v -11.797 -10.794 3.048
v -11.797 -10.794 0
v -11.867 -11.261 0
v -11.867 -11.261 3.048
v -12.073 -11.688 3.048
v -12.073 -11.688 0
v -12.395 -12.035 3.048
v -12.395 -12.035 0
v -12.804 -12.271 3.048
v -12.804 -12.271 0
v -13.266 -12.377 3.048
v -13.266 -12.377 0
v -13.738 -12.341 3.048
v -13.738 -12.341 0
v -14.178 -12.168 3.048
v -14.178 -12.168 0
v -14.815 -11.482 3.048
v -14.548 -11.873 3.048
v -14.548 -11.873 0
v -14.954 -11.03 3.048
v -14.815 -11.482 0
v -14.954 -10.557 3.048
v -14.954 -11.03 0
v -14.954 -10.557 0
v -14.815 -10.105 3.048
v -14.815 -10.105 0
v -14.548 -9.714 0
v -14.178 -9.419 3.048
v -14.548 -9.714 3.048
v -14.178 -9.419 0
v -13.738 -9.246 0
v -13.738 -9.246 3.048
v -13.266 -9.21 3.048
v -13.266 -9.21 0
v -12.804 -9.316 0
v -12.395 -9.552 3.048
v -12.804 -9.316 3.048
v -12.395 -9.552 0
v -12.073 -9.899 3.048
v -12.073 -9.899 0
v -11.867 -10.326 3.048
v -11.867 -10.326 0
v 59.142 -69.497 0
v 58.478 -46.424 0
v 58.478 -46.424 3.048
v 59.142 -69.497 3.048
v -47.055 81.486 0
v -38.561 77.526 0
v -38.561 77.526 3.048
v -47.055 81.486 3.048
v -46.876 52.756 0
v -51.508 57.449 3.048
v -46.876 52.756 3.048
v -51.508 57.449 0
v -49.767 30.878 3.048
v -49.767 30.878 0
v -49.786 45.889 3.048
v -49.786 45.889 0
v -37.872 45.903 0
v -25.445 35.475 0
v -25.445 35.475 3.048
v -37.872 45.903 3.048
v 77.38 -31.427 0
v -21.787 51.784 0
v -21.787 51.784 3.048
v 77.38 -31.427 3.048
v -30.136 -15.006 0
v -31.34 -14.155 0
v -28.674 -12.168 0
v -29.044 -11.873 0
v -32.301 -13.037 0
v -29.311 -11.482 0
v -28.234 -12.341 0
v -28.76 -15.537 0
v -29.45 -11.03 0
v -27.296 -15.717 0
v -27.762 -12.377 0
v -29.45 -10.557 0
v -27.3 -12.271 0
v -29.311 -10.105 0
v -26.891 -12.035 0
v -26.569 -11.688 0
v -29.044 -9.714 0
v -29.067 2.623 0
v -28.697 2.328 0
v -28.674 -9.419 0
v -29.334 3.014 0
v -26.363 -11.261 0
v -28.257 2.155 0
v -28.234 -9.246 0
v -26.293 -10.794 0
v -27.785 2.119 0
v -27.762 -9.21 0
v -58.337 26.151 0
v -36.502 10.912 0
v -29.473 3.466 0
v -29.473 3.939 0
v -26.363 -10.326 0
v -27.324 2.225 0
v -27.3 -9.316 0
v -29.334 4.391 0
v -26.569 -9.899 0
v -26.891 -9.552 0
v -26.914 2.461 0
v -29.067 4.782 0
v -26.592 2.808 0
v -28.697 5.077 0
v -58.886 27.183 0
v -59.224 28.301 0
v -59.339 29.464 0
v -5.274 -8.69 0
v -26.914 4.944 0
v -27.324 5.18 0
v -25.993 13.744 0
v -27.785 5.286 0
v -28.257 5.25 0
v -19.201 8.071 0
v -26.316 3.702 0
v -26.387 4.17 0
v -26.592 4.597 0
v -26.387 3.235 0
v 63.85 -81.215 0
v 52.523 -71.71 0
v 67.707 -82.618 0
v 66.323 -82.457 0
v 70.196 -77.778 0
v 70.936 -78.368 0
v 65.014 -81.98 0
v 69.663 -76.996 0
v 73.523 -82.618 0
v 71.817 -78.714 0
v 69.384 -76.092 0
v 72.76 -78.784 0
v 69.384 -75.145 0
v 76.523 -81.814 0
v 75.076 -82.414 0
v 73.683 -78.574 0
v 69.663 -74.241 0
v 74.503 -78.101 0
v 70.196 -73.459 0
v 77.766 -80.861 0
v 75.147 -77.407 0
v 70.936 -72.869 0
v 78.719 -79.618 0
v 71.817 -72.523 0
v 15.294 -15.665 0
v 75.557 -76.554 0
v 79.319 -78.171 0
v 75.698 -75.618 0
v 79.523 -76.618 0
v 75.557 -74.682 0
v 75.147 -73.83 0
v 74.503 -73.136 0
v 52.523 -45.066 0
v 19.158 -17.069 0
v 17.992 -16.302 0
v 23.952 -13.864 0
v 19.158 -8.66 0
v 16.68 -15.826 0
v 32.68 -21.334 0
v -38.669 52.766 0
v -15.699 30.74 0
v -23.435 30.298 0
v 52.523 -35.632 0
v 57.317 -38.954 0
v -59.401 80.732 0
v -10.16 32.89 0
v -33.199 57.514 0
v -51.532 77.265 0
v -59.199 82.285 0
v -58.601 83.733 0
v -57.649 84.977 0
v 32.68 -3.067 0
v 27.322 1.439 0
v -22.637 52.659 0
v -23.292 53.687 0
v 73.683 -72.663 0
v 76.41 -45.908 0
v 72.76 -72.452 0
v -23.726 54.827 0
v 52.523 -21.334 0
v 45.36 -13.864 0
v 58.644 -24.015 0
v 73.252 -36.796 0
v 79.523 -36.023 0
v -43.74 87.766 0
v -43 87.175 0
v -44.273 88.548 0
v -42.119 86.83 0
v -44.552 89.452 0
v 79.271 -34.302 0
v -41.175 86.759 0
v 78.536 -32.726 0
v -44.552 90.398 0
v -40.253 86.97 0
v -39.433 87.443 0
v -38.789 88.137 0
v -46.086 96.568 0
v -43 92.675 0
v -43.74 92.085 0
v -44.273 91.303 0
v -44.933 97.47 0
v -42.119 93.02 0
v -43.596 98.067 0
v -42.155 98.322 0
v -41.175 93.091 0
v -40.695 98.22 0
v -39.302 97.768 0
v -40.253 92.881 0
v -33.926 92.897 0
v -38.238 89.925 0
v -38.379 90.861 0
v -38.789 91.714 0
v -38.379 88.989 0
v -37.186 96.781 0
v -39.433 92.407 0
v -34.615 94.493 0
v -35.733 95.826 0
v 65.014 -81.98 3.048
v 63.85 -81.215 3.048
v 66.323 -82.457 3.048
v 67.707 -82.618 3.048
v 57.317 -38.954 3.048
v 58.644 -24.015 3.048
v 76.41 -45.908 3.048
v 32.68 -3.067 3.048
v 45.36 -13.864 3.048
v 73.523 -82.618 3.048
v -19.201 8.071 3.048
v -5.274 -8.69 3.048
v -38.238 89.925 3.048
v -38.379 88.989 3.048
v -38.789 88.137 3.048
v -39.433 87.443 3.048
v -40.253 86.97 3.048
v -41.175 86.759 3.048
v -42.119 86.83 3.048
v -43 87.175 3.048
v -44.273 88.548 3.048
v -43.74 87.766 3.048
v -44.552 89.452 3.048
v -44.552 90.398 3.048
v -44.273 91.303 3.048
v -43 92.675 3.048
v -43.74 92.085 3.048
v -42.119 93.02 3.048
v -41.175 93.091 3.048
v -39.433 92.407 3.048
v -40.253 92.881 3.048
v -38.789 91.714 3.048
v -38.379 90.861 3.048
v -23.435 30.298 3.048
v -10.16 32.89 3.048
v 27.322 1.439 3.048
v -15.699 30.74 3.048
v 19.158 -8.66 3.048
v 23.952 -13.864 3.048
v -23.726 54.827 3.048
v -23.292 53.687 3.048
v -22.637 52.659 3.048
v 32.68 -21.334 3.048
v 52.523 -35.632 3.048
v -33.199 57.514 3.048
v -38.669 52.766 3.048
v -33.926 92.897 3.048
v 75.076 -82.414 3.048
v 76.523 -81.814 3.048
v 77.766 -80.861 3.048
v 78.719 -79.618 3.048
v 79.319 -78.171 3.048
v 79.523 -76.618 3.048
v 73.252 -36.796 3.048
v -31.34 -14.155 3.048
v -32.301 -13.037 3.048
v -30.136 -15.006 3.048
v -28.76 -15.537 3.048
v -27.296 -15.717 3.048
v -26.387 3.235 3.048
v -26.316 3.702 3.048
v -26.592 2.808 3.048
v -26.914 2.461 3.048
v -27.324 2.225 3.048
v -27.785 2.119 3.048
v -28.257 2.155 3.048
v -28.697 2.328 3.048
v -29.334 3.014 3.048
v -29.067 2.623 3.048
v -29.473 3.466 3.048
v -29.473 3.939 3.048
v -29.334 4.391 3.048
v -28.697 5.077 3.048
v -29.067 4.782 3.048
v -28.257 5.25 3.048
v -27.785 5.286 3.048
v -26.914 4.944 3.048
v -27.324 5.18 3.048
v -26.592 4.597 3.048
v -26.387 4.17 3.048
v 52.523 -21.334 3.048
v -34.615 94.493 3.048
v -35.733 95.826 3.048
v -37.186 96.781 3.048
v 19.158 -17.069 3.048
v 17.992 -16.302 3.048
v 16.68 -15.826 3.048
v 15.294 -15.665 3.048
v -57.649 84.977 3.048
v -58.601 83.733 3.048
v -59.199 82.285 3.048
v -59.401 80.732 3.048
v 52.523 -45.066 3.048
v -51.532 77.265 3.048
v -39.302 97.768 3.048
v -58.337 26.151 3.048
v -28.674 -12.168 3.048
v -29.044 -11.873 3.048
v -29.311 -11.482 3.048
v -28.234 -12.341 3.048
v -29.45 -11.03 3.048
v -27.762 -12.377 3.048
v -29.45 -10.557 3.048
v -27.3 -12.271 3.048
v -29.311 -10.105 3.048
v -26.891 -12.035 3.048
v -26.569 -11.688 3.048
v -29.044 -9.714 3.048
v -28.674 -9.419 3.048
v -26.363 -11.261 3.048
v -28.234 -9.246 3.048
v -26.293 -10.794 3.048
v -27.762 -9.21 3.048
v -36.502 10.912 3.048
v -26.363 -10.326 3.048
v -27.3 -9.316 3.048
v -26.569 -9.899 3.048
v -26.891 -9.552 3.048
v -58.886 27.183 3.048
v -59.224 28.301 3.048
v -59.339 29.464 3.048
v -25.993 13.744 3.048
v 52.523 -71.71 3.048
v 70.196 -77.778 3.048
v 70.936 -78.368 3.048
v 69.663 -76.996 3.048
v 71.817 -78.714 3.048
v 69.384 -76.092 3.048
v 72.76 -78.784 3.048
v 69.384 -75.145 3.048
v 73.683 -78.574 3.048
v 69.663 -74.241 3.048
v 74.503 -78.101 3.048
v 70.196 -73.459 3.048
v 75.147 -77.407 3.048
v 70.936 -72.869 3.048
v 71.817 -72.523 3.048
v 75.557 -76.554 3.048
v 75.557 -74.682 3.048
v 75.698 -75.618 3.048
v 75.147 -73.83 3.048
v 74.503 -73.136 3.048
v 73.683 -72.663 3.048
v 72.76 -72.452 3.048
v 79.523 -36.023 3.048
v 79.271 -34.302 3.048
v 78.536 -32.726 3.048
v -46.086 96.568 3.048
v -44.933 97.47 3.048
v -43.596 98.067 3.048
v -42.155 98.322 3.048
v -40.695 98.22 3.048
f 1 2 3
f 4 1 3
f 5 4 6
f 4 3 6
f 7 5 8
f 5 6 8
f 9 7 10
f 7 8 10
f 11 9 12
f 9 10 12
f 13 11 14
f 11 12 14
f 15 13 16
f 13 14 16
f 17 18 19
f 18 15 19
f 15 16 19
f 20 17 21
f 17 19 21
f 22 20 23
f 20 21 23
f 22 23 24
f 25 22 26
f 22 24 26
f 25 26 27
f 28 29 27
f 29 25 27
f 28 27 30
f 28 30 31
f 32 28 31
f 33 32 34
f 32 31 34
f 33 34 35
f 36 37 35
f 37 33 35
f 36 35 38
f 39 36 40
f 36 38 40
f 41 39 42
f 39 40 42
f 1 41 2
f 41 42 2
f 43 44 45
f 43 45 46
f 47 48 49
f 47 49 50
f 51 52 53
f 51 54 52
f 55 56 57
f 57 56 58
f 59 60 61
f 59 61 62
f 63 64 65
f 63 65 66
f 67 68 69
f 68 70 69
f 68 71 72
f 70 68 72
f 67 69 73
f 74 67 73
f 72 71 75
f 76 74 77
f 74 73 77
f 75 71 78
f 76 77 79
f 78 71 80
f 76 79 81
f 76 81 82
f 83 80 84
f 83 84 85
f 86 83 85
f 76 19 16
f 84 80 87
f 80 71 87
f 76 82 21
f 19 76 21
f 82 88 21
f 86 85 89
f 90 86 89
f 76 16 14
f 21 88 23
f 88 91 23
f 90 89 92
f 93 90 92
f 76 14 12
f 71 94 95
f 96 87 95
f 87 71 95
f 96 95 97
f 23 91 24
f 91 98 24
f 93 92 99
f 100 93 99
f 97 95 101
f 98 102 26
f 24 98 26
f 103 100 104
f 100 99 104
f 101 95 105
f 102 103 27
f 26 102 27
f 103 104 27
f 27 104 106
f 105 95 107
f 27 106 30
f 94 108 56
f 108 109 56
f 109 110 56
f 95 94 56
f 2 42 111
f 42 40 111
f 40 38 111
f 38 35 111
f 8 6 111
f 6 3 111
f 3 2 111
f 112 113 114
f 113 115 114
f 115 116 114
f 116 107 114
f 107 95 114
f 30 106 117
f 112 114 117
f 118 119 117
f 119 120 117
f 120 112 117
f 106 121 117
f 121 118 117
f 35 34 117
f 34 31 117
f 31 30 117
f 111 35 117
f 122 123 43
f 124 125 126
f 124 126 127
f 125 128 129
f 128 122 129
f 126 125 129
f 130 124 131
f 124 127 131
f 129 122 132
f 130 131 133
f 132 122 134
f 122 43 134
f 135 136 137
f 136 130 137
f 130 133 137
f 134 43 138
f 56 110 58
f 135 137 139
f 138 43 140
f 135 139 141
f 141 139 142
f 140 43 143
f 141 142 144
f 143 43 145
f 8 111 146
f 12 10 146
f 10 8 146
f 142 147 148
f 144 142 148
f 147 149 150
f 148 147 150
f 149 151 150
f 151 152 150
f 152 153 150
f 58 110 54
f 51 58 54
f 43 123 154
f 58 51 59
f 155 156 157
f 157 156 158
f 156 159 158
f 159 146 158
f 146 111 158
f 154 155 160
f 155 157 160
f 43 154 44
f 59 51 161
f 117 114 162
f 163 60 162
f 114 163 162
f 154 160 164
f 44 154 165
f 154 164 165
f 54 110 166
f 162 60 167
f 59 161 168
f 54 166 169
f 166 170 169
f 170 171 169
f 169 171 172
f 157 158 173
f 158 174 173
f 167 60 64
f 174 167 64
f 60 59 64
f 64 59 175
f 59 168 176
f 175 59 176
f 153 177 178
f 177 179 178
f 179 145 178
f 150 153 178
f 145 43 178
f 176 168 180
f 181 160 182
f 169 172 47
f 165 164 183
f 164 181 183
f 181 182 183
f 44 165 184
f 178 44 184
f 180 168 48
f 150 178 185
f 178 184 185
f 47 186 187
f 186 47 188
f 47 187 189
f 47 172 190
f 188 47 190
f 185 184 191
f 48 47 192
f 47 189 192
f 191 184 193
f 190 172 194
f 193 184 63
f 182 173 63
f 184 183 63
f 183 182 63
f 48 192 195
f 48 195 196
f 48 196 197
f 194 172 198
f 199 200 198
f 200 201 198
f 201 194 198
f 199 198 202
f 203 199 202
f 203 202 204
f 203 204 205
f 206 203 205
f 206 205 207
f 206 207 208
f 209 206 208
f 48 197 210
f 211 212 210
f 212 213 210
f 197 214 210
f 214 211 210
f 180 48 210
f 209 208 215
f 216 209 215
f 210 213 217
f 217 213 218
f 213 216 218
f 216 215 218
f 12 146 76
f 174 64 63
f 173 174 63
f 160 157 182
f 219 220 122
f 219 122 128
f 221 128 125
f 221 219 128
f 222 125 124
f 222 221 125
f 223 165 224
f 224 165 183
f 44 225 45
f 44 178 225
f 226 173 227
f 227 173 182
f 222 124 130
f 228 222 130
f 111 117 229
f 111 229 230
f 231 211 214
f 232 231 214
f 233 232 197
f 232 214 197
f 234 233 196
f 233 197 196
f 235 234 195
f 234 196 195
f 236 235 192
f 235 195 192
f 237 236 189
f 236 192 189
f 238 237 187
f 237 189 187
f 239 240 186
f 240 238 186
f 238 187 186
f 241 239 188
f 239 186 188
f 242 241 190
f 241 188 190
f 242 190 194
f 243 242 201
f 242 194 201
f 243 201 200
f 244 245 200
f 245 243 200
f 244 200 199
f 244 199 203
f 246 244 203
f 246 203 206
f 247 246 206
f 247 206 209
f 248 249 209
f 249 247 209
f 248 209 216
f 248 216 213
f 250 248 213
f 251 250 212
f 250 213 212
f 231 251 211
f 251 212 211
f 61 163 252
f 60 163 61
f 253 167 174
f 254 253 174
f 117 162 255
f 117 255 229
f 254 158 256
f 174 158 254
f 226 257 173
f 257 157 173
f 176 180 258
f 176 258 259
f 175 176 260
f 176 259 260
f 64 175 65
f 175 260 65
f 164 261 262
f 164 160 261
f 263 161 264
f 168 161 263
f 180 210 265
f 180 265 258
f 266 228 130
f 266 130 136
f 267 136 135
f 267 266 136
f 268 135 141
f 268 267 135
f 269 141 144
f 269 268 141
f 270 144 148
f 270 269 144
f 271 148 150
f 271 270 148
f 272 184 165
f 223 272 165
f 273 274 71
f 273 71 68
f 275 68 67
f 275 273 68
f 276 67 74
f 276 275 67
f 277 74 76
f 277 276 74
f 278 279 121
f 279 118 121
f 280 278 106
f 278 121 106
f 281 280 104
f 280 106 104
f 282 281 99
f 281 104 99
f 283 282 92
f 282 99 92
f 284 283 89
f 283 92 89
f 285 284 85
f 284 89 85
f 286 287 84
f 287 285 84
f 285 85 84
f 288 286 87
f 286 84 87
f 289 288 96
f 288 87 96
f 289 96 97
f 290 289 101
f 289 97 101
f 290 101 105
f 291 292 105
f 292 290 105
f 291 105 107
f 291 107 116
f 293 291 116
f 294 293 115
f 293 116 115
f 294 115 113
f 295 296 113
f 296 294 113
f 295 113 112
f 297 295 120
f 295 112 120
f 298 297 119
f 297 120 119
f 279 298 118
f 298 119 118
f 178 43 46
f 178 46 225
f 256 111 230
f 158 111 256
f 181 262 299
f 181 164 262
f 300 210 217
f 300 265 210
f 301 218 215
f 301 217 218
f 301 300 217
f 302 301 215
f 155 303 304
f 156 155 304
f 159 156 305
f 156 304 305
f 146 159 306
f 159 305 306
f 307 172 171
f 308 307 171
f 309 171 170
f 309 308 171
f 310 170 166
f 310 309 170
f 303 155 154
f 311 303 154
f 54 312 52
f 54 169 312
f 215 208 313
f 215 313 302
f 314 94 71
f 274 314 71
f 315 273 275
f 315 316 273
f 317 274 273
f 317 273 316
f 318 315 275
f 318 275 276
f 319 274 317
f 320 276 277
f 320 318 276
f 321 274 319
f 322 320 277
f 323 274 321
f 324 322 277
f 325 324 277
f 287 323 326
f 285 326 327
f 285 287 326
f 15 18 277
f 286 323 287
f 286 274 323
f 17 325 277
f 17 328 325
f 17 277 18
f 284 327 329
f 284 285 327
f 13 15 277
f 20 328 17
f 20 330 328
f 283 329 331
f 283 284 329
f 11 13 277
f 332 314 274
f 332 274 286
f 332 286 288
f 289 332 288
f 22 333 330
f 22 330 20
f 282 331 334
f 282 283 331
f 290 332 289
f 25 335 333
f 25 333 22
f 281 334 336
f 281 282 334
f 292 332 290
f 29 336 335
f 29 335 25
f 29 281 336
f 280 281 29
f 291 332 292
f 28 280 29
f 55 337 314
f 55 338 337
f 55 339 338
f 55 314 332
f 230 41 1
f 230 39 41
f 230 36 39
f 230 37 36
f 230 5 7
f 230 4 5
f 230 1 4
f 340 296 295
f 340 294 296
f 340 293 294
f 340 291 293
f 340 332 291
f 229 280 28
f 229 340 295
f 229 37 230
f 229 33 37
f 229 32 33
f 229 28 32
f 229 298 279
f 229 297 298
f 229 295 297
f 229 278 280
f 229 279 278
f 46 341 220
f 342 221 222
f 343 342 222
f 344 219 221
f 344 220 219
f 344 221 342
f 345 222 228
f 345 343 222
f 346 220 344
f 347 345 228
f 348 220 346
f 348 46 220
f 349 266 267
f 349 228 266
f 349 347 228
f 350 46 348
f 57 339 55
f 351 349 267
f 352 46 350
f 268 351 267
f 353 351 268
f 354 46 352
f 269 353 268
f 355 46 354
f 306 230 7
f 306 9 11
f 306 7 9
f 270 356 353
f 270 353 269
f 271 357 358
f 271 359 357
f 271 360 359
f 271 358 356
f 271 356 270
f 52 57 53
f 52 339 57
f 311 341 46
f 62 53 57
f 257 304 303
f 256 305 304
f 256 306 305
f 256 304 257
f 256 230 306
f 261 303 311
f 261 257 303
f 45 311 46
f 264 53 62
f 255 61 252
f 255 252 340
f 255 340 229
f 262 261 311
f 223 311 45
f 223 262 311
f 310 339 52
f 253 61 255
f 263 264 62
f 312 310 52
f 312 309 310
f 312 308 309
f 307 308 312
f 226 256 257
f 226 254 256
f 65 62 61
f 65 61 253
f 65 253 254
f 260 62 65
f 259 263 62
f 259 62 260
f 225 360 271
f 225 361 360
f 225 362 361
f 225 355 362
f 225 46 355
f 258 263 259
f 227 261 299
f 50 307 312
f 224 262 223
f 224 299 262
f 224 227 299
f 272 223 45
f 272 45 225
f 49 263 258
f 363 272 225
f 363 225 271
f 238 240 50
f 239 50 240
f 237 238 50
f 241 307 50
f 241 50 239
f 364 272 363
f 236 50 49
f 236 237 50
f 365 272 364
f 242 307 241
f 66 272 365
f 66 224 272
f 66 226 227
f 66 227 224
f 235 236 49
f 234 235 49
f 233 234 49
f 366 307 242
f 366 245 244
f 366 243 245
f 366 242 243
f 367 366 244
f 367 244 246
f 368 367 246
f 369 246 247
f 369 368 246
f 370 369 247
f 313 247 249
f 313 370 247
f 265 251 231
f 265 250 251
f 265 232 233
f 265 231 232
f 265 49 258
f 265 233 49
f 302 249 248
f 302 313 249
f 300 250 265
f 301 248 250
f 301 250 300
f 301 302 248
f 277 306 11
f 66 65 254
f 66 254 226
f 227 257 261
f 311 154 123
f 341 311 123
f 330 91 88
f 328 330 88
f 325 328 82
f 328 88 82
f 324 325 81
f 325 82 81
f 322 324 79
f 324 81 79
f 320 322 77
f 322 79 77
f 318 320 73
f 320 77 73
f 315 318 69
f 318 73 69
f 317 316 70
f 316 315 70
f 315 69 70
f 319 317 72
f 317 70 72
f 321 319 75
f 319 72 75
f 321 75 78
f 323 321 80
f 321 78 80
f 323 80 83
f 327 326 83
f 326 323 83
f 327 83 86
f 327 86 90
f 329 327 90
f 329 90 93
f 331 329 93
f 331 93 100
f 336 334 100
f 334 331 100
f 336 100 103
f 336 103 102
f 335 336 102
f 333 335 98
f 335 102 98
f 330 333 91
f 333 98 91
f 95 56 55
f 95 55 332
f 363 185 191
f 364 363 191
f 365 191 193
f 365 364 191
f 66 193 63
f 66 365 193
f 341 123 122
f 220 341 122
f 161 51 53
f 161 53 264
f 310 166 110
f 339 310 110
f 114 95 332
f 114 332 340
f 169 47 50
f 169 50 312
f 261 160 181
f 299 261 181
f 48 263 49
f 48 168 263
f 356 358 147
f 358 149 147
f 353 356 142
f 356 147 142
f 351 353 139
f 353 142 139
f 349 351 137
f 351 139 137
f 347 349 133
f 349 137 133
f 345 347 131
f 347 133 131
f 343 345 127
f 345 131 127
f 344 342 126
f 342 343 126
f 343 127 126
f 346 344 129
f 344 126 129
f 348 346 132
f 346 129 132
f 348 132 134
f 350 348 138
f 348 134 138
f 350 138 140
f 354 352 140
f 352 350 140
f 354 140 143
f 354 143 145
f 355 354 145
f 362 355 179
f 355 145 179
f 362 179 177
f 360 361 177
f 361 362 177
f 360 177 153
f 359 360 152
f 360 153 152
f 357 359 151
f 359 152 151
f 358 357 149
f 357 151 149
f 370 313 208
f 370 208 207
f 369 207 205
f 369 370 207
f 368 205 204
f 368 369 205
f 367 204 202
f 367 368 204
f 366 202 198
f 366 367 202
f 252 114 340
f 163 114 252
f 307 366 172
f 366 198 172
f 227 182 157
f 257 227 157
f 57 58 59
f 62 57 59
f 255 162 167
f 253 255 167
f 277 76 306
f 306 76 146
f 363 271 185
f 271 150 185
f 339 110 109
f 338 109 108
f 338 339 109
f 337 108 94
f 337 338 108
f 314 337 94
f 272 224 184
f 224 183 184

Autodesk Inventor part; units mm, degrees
ref_plane "YZ Plane" through (0, 0, 0) normal (1, 0, 0) x (0, 1, 0)
ref_plane "XZ Plane" through (0, 0, 0) normal (0, 1, 0) x (-1, 0, 0)
ref_plane "XY Plane" through (0, 0, 0) normal (0, 0, 1) x (1, 0, 0)
sketch "Profile" plane through (0, 0, 0) normal (0, 0, 1) x (1, 0, 0)
  circle A0 centre (-41.4125, 89.9251) radius 3.175
  circle A1 centre (-27.9037, 3.7025) radius 1.5875
  circle A2 centre (-27.8803, -10.7935) radius 1.5875
  circle A3 centre (-13.3843, -10.7935) radius 1.5875
  circle A4 centre (72.5232, -75.6183) radius 3.175
  line L0 (-43.1149, 99.546) -> (-34.6506, 95.599)
  line L1 (-34.6506, 95.599) -> (-23.2362, 53)
  line L2 (-23.2362, 53) -> (79.5232, -33.2254)
  line L3 (-43.1149, 99.546) -> (-59.4044, 83.2171)
  line L4 (-59.4044, 83.2171) -> (-59.3372, 27.6567)
  line L5 (-59.3372, 27.6567) -> (-30.5183, -15.7204)
  line L6 (-30.5183, -15.7204) -> (17.4817, -15.6624)
  line L7 (65.5232, -82.6183) -> (79.5232, -82.6183)
  line L8 (79.5232, -82.6183) -> (79.5232, -33.2254)
  line L9 (17.4817, -15.6624) -> (52.5232, -45.0657)
  line L10 (-87.1899, 0) -> (107.3087, 0) construction
  line L11 (0, -119.0512) -> (0, 135.9789) construction
  line L12 (-36.2503, -15.7274) -> (-46.8807, -15.7402) construction
  line L13 (-41.4125, 89.9251) -> (-41.2847, -15.7335) construction
  line L14 (72.5232, -75.6183) -> (72.5232, 0) construction
  line L15 (72.5232, -75.6183) -> (0, -75.6183) construction
  line L16 (-41.4125, 89.9251) -> (0, 89.9251) construction
  line L17 (-23.2362, 53) -> (-59.3372, 27.6567) construction
  line L18 (23.9517, -13.8645) -> (32.6799, -3.0672)
  line L19 (-15.6986, 30.74) -> (-10.1602, 32.89)
  line L20 (-10.1602, 32.89) -> (27.3216, 1.4391)
  line L21 (-15.6986, 30.74) -> (-19.2013, 8.0713)
  line L22 (-19.2013, 8.0713) -> (-5.274, -8.6899)
  line L23 (-5.274, -8.6899) -> (19.1575, -8.6603)
  line L24 (19.1575, -8.6603) -> (27.3216, 1.4391)
  line L25 (-25.993, 13.7438) -> (-23.435, 30.2982)
  line L26 (-23.435, 30.2982) -> (-25.4448, 35.4753)
  line L27 (-25.4448, 35.4753) -> (-37.872, 45.903)
  line L28 (-49.7674, 30.8778) -> (-36.5022, 10.9116)
  line L29 (-36.5022, 10.9116) -> (-25.993, 13.7438)
  line L30 (-49.7674, 30.8778) -> (-49.7855, 45.8886)
  line L31 (-49.7855, 45.8886) -> (-37.872, 45.903)
  line L32 (52.5232, -45.0657) -> (52.5232, -71.7101)
  line L33 (52.5232, -71.7101) -> (65.5232, -82.6183)
  line L34 (-38.6692, 52.7662) -> (-33.1987, 57.5138)
  line L35 (-33.1987, 57.5138) -> (-38.5608, 77.5256)
  line L36 (-38.5608, 77.5256) -> (-47.0549, 81.4864)
  line L37 (-47.0549, 81.4864) -> (-51.5318, 77.2647)
  line L38 (-51.5318, 77.2647) -> (-51.5078, 57.4488)
  line L39 (-51.5078, 57.4488) -> (-46.8759, 52.7563)
  line L40 (-46.8759, 52.7563) -> (-38.6692, 52.7662)
  line L41 (32.6799, -3.0672) -> (45.3602, -13.8645)
  line L42 (45.3602, -13.8645) -> (23.9517, -13.8645)
  line L43 (32.6799, -21.3341) -> (52.5232, -21.3341)
  line L44 (32.6799, -21.3341) -> (52.5232, -35.6319)
  line L45 (52.5232, -35.6319) -> (52.5232, -21.3341)
  line L46 (58.4785, -46.424) -> (59.1425, -69.4967)
  line L47 (59.1425, -69.4967) -> (76.4098, -45.908)
  line L48 (76.4098, -45.908) -> (58.4785, -46.424)
  line L49 (57.3166, -38.9544) -> (58.6445, -24.0152)
  line L50 (58.6445, -24.0152) -> (73.2517, -36.7965)
  line L51 (73.2517, -36.7965) -> (57.3166, -38.9544)
  point P0 (0, 0)
  point P1 (65.5232, -75.6183)
  point P2 (-16, 37.7902)
  point P3 (-51.3919, 28.3472)
  point P4 (-34.7148, 3.2455)
  point P5 (-52.349, 37.4497)
  point P6 (-29.1922, 43.0466)
  dimension "d0" = 7
  dimension "d1" = 7
  dimension "d3" = 8
  dimension "d4" = 8
  dimension "d5" = 8
  dimension "d6" = 65
  dimension "d7" = 15
  dimension "d8" = 45
  dimension "d12" = 145
  dimension "d17" = 18
  dimension "d37" = 35
  dimension "d56" = 53
  dimension "d63" = 7
  dimension "d65" = 120
  dimension "d66" = 7
  dimension "d68" = 20
  dimension "d69" = 48
  dimension "d70" = 4.9237
extrude "Plate1" add sketch "Profile" along normal blind 3.048
fillet "OutsideFilletsFeature" radius 6 10 edges at (65.5232, -82.6183, 1.524) (79.5232, -82.6183, 1.524) (-43.1149, 99.546, 1.524) (-34.6506, 95.599, 1.524) (-59.4044, 83.2171, 1.524) (-23.2362, 53, 1.524) (-59.3372, 27.6567, 1.524) (-30.5183, -15.7204, 1.524) (17.4817, -15.6624, 1.524) (79.5232, -33.2254, 1.524)
equation "\"d1\" = d0"
equation "\"d4\" = d3"
equation "\"d5\" = d3"
equation "\"BendRadius\" = Thickness"
equation "\"BendReliefWidth\" = Thickness"
equation "\"BendReliefDepth\" = 0.5 * Thickness"
equation "\"CornerReliefSize\" = 4 * Thickness"
equation "\"MinimumRemnant\" = 2 * Thickness"
equation "\"TransitionRadius\" = BendRadius"
equation "\"JacobiRadiusSize\" = BendRadius"
equation "\"GapSize\" = Thickness"
equation "\"Thickness\" = 3.048"
properties part number "ShoulderBracketRedesign"
